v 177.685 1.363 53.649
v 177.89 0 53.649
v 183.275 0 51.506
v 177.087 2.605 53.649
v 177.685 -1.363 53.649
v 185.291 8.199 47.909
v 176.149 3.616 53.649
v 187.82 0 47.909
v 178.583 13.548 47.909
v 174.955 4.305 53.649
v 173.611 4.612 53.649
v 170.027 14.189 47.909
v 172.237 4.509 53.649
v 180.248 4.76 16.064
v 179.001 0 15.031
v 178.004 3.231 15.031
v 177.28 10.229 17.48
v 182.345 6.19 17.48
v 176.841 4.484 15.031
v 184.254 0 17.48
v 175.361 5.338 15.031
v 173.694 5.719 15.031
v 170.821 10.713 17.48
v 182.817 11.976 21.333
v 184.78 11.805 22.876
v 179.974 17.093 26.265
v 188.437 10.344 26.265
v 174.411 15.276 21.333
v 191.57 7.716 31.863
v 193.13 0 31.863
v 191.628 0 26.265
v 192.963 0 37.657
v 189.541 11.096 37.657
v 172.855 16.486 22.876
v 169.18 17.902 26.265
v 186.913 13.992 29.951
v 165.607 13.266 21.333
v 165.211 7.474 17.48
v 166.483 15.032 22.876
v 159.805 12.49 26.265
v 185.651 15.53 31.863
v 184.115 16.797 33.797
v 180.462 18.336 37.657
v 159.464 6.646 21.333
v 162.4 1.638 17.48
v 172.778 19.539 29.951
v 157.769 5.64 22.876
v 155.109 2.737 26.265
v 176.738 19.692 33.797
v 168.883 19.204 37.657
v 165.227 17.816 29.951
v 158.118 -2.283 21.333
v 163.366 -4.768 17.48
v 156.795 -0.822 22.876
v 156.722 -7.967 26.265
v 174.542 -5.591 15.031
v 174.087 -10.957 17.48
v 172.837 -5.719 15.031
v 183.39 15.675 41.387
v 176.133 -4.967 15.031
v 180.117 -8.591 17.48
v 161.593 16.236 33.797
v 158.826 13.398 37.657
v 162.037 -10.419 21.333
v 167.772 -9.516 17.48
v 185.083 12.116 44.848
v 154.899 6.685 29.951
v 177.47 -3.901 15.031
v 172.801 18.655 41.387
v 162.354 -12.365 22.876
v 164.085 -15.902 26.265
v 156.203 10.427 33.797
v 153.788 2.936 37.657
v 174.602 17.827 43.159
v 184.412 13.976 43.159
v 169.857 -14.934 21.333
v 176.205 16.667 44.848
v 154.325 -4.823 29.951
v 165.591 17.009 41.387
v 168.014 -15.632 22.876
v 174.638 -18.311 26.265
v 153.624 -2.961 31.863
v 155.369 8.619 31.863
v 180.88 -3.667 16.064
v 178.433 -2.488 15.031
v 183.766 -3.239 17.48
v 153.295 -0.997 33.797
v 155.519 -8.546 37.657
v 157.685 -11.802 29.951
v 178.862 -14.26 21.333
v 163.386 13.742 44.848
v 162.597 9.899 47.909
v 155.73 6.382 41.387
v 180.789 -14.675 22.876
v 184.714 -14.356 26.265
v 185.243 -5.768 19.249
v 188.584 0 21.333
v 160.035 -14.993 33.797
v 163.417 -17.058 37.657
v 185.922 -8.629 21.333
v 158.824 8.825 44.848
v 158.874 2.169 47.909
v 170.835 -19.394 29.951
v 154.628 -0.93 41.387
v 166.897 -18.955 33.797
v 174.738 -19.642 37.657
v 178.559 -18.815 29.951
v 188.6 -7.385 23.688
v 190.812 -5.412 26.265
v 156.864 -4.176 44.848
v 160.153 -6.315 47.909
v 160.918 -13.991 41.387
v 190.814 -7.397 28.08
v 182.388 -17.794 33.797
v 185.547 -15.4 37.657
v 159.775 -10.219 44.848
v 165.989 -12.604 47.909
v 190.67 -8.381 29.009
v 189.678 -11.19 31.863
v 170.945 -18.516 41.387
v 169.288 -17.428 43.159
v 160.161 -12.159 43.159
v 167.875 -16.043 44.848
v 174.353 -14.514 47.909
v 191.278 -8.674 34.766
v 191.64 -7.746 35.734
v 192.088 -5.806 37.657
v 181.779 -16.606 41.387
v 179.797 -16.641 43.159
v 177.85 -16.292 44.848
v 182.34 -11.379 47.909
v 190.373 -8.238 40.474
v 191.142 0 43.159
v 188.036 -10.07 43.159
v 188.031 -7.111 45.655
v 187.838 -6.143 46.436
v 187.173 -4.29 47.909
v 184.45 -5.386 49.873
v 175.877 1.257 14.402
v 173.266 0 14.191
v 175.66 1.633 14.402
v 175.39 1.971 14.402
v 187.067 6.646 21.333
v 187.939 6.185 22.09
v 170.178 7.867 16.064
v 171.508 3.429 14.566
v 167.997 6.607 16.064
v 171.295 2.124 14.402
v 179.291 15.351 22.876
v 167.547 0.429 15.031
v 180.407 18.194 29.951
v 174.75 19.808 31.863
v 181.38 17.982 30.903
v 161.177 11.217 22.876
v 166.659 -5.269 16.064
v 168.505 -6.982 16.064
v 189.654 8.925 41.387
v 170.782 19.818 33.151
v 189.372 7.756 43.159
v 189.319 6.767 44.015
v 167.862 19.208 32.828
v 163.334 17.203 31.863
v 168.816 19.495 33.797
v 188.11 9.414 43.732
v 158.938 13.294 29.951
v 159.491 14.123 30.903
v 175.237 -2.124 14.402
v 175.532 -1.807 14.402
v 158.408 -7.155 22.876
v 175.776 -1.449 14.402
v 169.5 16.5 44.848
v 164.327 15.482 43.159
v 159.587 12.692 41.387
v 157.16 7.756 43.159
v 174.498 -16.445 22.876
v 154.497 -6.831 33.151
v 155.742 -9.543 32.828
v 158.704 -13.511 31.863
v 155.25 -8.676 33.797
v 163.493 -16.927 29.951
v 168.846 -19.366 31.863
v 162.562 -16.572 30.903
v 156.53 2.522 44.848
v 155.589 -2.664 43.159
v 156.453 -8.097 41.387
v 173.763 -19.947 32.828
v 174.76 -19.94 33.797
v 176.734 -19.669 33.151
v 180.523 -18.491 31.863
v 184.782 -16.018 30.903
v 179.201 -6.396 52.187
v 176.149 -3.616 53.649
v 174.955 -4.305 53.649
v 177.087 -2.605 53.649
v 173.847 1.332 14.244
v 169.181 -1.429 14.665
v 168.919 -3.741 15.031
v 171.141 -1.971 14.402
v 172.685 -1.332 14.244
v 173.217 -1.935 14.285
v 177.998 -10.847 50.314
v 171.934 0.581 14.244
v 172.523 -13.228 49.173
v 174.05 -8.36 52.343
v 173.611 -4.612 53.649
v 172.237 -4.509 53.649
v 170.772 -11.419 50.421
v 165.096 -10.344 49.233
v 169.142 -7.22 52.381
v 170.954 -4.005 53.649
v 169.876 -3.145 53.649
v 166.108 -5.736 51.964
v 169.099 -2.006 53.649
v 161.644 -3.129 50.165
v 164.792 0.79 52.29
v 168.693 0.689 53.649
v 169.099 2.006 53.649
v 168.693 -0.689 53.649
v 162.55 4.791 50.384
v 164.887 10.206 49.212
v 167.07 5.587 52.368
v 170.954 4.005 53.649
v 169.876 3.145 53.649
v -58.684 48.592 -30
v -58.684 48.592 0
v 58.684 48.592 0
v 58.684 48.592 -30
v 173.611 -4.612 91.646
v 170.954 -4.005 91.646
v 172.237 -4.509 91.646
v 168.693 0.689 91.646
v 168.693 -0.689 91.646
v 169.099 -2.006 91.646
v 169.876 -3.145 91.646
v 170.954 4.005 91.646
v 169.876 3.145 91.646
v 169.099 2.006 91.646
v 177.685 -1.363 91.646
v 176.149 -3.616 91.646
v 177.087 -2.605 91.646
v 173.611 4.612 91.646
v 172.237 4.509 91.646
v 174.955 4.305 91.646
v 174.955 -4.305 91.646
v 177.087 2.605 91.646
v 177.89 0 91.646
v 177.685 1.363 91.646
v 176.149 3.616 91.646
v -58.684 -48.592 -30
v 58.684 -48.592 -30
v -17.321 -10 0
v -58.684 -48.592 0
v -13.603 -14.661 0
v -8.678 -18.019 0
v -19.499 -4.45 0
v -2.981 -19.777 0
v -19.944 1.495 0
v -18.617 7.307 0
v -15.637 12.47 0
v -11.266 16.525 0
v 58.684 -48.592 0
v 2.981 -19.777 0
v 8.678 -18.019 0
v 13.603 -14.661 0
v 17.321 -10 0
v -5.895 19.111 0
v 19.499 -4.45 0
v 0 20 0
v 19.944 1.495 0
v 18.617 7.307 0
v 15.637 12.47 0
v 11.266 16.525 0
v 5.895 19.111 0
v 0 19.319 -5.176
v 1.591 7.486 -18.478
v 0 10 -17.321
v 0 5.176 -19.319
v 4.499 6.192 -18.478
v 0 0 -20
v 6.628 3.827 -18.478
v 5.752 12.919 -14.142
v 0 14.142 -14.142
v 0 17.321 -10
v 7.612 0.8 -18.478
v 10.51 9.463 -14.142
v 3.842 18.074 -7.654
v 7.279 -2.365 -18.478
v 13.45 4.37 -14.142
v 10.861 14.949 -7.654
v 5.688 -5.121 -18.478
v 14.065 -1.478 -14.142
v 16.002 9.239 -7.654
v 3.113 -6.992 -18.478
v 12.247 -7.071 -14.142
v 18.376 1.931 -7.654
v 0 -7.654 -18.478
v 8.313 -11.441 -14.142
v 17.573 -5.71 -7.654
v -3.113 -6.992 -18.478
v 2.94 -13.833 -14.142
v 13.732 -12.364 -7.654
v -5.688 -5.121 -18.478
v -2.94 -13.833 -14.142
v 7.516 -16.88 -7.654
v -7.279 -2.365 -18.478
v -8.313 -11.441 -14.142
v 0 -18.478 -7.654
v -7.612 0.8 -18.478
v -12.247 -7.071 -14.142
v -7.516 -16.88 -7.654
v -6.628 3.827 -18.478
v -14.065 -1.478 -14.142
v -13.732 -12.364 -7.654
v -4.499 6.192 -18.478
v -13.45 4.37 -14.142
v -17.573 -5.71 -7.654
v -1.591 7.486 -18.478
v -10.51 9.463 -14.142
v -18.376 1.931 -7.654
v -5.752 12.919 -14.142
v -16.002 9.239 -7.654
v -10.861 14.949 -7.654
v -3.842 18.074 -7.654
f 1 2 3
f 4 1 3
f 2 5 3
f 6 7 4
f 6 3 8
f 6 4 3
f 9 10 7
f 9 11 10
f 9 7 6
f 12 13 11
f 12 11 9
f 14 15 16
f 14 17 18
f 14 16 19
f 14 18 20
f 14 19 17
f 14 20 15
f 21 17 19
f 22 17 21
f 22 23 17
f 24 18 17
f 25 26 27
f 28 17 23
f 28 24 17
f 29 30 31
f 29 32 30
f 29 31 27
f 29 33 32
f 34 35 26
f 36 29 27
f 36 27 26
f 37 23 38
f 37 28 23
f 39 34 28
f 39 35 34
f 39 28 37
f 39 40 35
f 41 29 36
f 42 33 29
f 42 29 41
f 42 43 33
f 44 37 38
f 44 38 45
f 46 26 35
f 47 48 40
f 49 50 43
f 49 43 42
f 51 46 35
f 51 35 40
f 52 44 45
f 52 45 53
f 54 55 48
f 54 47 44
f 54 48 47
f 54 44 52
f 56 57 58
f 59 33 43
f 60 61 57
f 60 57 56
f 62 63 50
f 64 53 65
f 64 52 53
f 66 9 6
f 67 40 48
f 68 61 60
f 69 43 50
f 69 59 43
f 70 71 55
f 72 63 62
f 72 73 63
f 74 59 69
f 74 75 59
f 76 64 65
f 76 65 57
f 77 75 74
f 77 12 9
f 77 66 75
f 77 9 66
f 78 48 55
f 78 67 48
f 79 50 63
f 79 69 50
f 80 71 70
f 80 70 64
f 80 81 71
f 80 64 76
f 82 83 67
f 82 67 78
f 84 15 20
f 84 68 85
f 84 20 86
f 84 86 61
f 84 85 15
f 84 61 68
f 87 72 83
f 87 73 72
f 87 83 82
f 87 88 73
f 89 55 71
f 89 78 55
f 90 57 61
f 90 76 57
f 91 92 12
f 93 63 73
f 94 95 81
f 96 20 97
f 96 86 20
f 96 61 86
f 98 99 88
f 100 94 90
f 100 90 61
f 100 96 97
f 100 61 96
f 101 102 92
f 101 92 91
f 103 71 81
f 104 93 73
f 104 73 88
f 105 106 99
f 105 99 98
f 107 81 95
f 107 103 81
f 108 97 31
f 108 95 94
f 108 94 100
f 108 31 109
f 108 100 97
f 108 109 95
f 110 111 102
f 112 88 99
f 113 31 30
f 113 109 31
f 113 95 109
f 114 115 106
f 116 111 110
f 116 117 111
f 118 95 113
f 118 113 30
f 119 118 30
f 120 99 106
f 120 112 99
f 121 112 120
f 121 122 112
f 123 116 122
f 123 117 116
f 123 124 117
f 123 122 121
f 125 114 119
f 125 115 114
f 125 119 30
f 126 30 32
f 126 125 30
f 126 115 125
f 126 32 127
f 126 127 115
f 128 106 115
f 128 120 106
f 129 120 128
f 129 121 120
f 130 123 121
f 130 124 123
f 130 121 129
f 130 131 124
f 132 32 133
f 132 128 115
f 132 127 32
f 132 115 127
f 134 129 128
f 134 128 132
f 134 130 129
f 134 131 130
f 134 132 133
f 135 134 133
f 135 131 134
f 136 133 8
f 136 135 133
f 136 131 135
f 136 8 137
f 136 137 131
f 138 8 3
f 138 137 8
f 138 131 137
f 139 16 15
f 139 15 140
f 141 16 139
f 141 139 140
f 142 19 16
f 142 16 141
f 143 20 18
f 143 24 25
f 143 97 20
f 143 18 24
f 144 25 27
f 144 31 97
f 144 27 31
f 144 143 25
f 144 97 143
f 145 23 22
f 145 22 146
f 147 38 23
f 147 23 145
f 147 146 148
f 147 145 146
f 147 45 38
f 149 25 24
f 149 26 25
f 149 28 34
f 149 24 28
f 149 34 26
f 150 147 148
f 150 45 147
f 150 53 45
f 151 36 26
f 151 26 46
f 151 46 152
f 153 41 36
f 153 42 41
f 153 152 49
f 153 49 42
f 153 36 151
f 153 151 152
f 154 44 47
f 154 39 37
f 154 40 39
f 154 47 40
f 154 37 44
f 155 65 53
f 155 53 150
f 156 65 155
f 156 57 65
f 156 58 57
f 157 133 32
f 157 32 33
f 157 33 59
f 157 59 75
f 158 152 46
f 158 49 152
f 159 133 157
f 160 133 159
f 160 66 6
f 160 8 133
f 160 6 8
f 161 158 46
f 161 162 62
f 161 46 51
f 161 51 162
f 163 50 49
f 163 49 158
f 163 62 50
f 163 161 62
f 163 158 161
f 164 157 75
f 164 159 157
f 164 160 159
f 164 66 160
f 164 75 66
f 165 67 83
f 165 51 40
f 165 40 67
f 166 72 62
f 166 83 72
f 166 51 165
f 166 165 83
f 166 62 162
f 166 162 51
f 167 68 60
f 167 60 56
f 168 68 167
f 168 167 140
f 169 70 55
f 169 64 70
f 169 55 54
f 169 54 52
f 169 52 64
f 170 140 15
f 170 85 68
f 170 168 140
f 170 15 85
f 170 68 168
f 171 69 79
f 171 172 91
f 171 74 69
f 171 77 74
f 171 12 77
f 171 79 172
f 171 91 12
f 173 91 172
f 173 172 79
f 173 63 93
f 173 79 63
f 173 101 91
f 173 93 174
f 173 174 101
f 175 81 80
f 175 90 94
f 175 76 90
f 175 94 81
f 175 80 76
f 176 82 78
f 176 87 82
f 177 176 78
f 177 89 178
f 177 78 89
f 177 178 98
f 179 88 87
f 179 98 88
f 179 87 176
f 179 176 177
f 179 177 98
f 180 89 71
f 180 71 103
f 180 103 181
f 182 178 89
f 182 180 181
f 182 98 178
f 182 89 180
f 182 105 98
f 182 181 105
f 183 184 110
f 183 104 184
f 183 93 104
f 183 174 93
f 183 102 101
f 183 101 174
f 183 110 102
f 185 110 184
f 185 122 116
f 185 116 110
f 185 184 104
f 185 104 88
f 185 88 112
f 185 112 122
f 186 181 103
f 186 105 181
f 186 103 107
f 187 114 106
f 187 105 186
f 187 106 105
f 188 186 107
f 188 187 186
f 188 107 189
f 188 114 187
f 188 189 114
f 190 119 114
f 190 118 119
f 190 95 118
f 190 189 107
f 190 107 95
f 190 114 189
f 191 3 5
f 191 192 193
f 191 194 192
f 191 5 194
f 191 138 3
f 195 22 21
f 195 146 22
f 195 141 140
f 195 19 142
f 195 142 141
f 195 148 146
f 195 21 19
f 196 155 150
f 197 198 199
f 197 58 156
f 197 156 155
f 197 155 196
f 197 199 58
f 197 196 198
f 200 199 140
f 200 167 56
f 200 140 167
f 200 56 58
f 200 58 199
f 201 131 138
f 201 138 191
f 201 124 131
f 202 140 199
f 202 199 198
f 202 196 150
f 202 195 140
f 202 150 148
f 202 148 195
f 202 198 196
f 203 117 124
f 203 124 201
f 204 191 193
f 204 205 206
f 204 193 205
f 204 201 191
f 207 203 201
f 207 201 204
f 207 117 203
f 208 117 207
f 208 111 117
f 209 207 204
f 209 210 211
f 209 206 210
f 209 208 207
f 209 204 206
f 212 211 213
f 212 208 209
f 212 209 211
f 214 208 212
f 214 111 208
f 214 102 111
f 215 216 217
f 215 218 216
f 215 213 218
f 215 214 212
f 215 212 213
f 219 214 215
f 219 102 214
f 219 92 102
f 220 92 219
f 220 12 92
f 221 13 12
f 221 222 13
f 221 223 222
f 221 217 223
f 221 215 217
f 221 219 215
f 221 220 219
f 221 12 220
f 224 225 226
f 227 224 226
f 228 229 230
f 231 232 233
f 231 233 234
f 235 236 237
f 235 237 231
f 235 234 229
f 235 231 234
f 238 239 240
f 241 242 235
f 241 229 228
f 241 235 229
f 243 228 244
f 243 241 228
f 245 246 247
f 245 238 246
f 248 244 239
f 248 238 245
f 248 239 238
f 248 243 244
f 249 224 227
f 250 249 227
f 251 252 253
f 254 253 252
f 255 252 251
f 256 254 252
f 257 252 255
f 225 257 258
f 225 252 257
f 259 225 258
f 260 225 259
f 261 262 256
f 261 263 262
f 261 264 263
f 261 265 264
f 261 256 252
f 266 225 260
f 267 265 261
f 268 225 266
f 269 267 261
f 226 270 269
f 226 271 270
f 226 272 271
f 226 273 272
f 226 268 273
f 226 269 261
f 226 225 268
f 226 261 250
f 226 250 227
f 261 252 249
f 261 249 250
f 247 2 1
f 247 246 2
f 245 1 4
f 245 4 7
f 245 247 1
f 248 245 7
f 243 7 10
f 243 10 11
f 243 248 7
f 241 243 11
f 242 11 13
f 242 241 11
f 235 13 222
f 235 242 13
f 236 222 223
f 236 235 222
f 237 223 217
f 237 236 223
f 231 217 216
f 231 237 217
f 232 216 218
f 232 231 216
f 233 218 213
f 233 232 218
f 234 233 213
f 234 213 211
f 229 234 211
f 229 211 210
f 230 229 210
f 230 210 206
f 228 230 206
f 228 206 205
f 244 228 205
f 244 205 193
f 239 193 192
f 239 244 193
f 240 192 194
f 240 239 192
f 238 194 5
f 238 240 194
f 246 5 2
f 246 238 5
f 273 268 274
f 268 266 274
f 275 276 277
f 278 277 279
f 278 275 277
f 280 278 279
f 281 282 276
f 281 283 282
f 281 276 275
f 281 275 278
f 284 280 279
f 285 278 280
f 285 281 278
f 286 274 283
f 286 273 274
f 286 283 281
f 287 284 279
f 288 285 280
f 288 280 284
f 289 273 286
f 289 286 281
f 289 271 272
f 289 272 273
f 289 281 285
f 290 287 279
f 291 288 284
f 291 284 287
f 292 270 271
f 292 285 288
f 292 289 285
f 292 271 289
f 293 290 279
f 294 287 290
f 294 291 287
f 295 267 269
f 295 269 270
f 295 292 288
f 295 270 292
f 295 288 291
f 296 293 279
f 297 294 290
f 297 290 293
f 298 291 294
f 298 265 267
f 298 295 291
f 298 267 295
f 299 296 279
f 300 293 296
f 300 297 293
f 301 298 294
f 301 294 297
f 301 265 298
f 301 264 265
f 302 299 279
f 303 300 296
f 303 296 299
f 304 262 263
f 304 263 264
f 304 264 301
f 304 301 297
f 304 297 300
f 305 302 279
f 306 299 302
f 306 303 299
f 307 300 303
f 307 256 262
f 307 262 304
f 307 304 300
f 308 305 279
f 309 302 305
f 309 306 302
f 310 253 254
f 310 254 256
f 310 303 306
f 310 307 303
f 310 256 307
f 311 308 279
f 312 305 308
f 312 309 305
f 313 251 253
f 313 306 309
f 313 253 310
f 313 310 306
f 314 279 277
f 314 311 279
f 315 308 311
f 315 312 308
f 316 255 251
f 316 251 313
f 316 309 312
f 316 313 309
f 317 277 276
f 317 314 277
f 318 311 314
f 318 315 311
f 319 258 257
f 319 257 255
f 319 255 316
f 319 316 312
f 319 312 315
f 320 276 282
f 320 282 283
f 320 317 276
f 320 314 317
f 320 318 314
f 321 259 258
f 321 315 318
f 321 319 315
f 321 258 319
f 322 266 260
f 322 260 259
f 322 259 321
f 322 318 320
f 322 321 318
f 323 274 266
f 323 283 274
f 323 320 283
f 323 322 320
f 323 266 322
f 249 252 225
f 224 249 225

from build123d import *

# Parameters (mm, degrees)
F0_W     = 117.36849
F0_H     = 97.184904
F1_DEPTH = 30


with BuildPart() as f1:
    # F0 (on Top) → F1 (new body)
    with BuildSketch(Plane.XY):
        Rectangle(F0_W, F0_H)
    extrude(amount=-F1_DEPTH)

    # F2 (on Right) → F3 (revolve, cut)
    with BuildSketch(Plane.YZ):
        with BuildLine():
            Line((0, 20), (0, -20))
            ThreePointArc((0, -20), (20, 0), (0, 20))
        make_face()
    revolve(axis=Axis((0, 0, 0), (0, 0, -1)), mode=Mode.SUBTRACT)


with BuildPart() as f5:
    # F4 (on Front) → F5 (revolve)
    with BuildSketch(Plane.XZ):
        with BuildLine():
            Line((173.265755, 91.645658), (173.265755, 14.191176))
            ThreePointArc((173.265755, 14.191176), (193.129796, 31.863115), (177.890226, 53.649189))
            Line((177.890226, 53.649189), (177.890226, 91.645658))
            Line((177.890226, 91.645658), (173.265755, 91.645658))
        make_face()
    revolve(axis=Axis((173.265755, 0, 52.918417), (0, 0, 1)))


solid = Compound([f1.part, f5.part])
